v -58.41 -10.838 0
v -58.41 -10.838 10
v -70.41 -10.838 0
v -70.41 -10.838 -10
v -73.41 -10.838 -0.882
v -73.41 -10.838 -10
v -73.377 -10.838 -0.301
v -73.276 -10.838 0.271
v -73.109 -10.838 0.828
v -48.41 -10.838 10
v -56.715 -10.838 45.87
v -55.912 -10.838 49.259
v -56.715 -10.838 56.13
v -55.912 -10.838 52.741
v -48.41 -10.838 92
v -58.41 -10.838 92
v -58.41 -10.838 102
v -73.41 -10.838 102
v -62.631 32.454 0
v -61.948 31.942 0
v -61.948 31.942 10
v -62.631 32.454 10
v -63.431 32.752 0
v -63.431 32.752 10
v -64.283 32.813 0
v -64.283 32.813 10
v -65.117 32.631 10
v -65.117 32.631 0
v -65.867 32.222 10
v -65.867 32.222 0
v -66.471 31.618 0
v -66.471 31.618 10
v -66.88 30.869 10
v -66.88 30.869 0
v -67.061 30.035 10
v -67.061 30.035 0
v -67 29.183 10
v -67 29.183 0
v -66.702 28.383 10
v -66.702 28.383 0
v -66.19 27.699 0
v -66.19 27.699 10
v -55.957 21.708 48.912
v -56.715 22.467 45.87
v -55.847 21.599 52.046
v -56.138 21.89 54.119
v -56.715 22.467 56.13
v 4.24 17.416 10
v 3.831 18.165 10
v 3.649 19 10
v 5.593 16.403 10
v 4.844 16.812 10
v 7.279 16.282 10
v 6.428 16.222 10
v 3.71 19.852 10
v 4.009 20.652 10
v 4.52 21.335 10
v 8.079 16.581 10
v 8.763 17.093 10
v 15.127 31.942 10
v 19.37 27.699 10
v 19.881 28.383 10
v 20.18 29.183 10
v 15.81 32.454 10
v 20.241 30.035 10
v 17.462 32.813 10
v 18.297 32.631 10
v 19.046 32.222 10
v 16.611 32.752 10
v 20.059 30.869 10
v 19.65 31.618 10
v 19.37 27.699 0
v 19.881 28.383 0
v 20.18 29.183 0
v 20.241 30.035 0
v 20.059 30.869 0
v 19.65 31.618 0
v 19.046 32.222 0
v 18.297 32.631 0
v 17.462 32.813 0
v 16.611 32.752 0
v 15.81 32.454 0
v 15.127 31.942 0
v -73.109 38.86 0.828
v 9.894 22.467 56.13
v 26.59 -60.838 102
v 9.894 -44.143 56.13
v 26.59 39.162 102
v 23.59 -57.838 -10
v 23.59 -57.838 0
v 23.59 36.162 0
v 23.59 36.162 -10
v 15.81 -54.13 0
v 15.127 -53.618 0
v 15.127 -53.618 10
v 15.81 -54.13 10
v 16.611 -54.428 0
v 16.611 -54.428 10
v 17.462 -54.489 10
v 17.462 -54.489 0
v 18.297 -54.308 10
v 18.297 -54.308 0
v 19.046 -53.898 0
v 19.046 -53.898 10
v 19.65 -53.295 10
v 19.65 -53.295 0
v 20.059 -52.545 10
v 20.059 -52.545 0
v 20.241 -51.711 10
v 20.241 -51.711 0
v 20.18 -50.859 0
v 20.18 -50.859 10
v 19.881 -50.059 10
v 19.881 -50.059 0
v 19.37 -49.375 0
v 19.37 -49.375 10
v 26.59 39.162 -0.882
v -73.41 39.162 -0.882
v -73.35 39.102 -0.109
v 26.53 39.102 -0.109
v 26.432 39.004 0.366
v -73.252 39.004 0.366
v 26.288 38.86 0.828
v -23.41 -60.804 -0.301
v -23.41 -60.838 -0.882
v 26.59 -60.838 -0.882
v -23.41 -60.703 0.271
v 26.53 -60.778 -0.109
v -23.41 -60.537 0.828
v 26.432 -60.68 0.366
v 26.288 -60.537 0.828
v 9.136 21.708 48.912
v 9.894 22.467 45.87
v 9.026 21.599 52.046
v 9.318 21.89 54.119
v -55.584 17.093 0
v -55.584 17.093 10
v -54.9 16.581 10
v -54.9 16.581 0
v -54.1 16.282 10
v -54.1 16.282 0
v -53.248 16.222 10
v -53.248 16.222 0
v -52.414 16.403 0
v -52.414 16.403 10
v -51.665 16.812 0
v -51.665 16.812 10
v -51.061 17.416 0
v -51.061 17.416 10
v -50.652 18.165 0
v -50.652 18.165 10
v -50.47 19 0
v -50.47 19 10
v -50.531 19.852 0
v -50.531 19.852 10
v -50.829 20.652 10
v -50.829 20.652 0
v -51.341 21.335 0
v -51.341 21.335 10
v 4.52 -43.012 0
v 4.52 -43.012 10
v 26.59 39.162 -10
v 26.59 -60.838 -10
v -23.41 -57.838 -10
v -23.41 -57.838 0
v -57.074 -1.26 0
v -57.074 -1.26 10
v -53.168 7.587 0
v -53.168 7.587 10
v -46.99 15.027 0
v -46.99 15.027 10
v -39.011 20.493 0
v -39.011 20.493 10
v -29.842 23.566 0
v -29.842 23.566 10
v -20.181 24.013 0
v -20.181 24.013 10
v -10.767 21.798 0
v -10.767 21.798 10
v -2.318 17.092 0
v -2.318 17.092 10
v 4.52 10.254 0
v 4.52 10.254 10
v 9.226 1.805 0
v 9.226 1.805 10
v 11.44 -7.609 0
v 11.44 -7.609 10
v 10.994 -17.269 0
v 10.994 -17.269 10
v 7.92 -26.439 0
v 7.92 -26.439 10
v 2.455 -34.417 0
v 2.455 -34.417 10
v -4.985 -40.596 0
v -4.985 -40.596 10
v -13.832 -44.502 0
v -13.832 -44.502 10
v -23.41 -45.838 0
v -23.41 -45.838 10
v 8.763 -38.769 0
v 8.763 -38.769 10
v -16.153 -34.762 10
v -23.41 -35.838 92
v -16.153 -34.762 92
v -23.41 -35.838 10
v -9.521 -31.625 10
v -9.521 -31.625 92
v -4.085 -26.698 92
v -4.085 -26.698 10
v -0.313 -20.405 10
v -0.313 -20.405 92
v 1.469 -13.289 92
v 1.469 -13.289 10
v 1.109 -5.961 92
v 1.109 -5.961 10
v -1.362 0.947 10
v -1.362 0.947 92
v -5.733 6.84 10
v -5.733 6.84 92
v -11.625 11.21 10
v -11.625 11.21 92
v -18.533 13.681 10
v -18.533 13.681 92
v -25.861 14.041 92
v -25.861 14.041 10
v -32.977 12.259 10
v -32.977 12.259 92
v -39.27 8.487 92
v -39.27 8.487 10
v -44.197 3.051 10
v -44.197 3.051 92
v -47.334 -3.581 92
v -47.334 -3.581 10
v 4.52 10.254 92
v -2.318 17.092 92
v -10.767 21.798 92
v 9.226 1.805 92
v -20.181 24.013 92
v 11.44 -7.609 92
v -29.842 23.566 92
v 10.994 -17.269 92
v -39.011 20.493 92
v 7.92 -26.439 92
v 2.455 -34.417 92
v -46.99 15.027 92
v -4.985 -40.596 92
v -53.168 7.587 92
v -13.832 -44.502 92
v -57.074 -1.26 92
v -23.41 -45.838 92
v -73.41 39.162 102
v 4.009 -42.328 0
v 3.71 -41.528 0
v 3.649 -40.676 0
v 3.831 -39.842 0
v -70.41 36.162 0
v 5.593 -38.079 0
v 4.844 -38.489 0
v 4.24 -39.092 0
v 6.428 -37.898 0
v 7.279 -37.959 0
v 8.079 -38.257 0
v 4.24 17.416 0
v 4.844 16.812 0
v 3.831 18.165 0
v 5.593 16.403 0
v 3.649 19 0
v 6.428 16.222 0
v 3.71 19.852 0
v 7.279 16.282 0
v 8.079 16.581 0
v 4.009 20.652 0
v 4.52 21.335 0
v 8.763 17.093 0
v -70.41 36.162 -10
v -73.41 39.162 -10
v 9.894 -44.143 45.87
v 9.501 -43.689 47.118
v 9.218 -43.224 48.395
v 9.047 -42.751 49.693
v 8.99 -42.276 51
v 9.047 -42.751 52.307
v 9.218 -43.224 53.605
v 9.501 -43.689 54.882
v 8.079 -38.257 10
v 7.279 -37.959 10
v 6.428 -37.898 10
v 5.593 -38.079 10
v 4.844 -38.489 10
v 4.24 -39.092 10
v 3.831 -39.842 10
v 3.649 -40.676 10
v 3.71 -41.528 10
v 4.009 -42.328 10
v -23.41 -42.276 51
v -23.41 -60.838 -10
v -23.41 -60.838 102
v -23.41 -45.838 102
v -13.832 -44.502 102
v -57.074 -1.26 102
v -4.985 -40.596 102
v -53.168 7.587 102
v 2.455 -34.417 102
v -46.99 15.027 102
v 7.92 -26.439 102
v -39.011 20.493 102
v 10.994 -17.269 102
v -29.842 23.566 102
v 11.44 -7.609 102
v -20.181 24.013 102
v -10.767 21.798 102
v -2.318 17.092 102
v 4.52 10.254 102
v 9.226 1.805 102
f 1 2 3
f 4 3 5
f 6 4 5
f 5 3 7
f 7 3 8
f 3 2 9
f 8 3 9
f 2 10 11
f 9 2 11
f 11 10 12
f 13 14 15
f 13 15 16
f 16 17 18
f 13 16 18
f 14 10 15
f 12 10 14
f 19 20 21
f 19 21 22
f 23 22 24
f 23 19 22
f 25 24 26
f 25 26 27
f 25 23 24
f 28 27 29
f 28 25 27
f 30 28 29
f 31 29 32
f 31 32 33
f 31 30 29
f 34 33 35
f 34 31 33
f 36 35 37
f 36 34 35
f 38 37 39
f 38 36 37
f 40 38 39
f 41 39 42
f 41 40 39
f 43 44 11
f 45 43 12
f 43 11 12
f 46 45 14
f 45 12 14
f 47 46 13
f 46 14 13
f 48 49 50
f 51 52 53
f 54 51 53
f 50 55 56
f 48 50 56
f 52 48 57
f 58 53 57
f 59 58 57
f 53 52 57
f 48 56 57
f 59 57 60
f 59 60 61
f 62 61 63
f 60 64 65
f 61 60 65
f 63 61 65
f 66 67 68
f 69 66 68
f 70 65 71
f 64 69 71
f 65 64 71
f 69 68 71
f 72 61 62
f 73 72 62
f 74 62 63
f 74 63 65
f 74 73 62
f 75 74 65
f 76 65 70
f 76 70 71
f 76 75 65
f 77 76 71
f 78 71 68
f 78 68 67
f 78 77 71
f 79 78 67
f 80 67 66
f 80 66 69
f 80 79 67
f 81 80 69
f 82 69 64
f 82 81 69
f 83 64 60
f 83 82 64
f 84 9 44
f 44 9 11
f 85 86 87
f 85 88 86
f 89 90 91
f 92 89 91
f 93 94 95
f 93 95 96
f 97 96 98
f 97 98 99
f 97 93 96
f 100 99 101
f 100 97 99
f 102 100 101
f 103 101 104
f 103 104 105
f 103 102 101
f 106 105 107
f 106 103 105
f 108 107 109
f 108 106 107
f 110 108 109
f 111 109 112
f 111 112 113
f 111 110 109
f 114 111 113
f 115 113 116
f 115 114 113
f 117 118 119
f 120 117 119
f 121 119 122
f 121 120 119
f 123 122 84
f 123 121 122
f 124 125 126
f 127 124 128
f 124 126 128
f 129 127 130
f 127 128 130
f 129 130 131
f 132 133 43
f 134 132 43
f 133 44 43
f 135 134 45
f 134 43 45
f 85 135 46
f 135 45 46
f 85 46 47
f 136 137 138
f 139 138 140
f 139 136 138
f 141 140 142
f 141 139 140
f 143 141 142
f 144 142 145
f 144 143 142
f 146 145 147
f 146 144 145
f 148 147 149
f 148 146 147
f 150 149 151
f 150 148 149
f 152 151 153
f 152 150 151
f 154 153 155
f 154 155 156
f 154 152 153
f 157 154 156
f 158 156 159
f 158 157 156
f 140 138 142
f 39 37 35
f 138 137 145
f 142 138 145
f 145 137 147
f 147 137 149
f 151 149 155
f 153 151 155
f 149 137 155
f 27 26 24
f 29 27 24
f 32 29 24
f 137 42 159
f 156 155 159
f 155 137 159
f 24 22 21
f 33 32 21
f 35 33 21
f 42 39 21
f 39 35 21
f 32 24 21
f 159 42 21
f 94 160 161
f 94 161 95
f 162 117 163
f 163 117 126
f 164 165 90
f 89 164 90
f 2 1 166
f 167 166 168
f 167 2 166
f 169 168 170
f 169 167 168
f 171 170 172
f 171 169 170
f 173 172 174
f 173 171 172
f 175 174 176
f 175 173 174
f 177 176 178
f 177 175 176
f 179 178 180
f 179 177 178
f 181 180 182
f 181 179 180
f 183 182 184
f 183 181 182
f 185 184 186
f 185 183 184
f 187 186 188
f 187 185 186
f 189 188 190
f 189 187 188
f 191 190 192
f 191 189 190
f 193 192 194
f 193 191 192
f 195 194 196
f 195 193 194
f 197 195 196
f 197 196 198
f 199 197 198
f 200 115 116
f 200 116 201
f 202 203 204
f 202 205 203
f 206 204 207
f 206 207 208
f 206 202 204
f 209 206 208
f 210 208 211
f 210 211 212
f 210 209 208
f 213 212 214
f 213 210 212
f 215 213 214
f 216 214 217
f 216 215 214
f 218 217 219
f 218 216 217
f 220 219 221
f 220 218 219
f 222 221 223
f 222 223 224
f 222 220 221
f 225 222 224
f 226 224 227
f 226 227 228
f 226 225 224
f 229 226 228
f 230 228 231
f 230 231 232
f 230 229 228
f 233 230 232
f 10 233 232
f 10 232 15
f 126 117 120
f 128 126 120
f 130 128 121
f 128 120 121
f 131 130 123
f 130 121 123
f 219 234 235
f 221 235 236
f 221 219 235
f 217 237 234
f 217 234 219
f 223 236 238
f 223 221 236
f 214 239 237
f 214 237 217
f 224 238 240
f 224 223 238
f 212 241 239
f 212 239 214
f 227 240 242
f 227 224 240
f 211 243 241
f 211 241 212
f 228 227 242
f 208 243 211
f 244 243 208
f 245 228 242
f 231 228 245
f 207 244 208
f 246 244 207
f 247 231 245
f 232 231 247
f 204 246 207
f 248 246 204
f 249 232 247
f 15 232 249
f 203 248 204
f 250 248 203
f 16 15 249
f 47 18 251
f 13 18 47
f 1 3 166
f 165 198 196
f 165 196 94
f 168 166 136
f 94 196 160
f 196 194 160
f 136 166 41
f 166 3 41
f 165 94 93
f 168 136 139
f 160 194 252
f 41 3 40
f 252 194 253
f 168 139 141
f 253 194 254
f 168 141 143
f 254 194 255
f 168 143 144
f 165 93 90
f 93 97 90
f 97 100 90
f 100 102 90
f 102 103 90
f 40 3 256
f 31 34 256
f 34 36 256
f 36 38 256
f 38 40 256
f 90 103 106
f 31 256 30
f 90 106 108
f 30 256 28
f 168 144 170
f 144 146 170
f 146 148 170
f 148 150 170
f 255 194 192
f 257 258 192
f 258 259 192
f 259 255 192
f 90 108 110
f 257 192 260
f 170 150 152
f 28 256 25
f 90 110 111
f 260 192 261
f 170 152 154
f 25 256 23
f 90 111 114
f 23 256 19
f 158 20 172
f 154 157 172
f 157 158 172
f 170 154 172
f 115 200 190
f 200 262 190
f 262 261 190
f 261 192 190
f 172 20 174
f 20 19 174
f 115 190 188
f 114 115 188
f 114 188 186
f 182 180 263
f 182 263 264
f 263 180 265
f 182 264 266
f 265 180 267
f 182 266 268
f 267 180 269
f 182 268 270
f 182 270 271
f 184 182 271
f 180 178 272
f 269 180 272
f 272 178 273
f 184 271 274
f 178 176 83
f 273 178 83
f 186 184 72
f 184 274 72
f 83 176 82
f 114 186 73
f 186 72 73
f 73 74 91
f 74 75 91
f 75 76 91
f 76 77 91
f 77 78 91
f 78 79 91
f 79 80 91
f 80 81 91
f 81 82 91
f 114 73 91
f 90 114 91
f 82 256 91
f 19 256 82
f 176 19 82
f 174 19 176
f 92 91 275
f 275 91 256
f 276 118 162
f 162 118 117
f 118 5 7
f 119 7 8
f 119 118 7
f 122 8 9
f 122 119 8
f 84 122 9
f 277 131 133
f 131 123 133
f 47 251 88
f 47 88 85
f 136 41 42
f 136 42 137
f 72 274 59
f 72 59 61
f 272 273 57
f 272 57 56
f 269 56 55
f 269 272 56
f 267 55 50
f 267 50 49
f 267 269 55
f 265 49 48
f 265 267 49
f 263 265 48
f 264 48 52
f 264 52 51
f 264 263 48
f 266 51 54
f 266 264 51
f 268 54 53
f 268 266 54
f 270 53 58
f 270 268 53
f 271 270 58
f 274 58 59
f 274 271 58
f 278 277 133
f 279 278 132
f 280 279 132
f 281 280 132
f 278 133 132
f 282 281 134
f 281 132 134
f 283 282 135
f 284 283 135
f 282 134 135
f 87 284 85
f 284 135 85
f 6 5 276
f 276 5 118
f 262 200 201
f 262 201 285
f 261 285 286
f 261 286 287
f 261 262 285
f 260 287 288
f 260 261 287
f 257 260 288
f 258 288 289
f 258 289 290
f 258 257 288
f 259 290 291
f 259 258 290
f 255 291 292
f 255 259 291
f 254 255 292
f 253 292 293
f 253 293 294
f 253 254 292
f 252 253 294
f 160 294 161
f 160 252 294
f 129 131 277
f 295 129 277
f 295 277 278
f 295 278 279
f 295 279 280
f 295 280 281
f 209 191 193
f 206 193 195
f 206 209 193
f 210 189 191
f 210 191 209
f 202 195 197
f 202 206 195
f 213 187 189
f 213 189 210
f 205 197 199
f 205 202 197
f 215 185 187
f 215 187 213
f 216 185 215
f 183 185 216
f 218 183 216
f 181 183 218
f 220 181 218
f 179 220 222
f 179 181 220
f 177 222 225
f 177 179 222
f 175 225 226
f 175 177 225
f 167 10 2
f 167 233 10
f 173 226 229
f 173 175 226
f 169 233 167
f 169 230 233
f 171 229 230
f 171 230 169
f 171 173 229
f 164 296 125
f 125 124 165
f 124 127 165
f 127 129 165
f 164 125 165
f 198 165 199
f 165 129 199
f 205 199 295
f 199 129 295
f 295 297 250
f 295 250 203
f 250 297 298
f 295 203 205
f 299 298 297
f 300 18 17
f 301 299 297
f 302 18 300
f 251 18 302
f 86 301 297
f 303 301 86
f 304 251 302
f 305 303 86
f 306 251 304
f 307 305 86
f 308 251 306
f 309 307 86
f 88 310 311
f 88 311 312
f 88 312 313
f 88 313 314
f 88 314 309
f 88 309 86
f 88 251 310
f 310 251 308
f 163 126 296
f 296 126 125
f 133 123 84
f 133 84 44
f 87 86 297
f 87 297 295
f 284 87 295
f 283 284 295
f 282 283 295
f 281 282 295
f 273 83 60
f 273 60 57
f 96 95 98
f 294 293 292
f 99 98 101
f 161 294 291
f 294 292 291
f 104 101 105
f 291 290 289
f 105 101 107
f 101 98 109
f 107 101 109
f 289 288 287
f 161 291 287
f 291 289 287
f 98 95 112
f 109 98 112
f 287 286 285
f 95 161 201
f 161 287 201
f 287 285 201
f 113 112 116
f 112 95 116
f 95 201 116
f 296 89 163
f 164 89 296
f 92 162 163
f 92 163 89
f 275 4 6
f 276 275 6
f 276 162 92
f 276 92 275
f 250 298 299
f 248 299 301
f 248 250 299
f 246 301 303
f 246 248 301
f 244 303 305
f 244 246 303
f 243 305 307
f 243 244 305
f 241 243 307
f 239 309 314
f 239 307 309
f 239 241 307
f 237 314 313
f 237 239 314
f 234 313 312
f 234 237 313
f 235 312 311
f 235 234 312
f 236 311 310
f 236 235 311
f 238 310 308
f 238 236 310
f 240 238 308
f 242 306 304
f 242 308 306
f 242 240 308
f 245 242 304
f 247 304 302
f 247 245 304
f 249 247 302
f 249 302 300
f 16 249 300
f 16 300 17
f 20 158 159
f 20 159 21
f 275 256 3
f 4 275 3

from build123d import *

# Parameters (mm, degrees)
ESQUISSE2_W                  = 100
ESQUISSE2_H                  = 100
BOSS_EXTRU_1_DEPTH           = 51
BOSS_EXTRU_1_TAPER           = 20
ENL_V_MAT_EXTRU_1_DEPTH      = 140.622233322
ENL_V_MAT_EXTRU_1_DEPTH_BACK = 140.622233322
ESQUISSE3_R                  = 25
ENL_V_MAT_EXTRU_2_DEPTH      = 140.622233322
ENL_V_MAT_EXTRU_2_DEPTH_BACK = 10
ESQUISSE5_R                  = 35
ENL_V_START                  = -10
ESQUISSE6_R                  = 35
ENL_V_MAT_EXTRU_3_DEPTH      = 10
ESQUISSE7_W                  = 50
ESQUISSE7_H                  = 50
ENL_V_MAT_EXTRU_4_DEPTH      = 140.622233322
CONG_1_R                     = 15
ENL_V_MAT_EXTRU_8_DEPTH      = 10
BOSS_EXTRU_2_DEPTH           = 10
CONG_2_R                     = 5


with BuildPart() as part:
    # Esquisse2 → Boss.-Extru.1 (new body)
    with BuildSketch(Plane.XY):
        with Locations((-23.410404624, -10.838150289)):
            Rectangle(ESQUISSE2_W, ESQUISSE2_H)
    boss_extru_1 = extrude(amount=BOSS_EXTRU_1_DEPTH, taper=BOSS_EXTRU_1_TAPER)

    # Symétrie4: Boss.-Extru.1 across plane
    add(boss_extru_1.mirror(Plane.XY.offset(51)))

    # Esquisse3 → Enlèv. mat.-Extru.1 (cut, two sides: drawn at the far end of the back side and taken through both)
    with BuildSketch(Plane.XY.offset(102).offset(-ENL_V_MAT_EXTRU_1_DEPTH_BACK)):
        with Locations((-23.410404624, -10.838150289)):
            Circle(ESQUISSE3_R)
    extrude(amount=ENL_V_MAT_EXTRU_1_DEPTH + ENL_V_MAT_EXTRU_1_DEPTH_BACK, mode=Mode.SUBTRACT)

    # Esquisse5 → Enlèv. mat.-Extru.2 (cut, two sides: drawn at the far end of the back side and taken through both)
    with BuildSketch(Plane.XY.offset(102).offset(-ENL_V_MAT_EXTRU_2_DEPTH_BACK)):
        with Locations(Location((-23.410404624, -10.838150289, 0), (0, 0, 180))):
            Circle(ESQUISSE5_R)
    extrude(amount=ENL_V_MAT_EXTRU_2_DEPTH + ENL_V_MAT_EXTRU_2_DEPTH_BACK, mode=Mode.SUBTRACT)

    # Esquisse6 → Enlèv. mat.-Extru.3 (cut)
    with BuildSketch(Plane(origin=(0, 0, 0), x_dir=(-1, 0, 0), z_dir=(0, 0, -1)).offset(ENL_V_START)):
        with Locations((23.410404624, -10.838150289)):
            Circle(ESQUISSE6_R)
    extrude(amount=ENL_V_MAT_EXTRU_3_DEPTH, mode=Mode.SUBTRACT)

    # Esquisse7 → Enlèv. mat.-Extru.4 (cut, through all)
    with BuildSketch(Plane(origin=(0, 0, 0), x_dir=(-1, 0, 0), z_dir=(0, 0, -1))):
        with Locations((48.410404624, -35.838150289)):
            Rectangle(ESQUISSE7_W, ESQUISSE7_H)
    extrude(amount=-ENL_V_MAT_EXTRU_4_DEPTH, mode=Mode.SUBTRACT)

    # Congé1
    cong_1_edges = [part.edges().sort_by_distance(p)[0] for p in [
        (8.027113428, -10.838150289, 51),
        (-23.410404624, 20.599367763, 51),
        (-54.847922677, 4.880608737, 51),
    ]]
    fillet(cong_1_edges, radius=CONG_1_R)

    # Esquisse8 → Enlèv. mat.-Extru.8 (cut)
    with BuildSketch(Plane(origin=(0, 0, 0), x_dir=(-1, 0, 0), z_dir=(0, 0, -1))):
        with BuildLine():
            Line((-15.12691495, 31.941809973), (-4.520313233, 21.335208255))
            ThreePointArc((-4.520313233, 21.335208255), (-4.520313233, 17.092567568), (-8.76295392, 17.092567568))
            Line((-8.76295392, 17.092567568), (-19.369555638, 27.699169286))
            ThreePointArc((-19.369555638, 27.699169286), (-19.369555638, 31.941809973), (-15.12691495, 31.941809973))
        make_face()
        with BuildLine():
            Line((-19.369555638, -49.375469864), (-8.76295392, -38.768868146))
            ThreePointArc((-8.76295392, -38.768868146), (-4.520313233, -38.768868146), (-4.520313233, -43.011508833))
            Line((-4.520313233, -43.011508833), (-15.12691495, -53.618110551))
            ThreePointArc((-15.12691495, -53.618110551), (-19.369555638, -53.618110551), (-19.369555638, -49.375469864))
        make_face()
        with BuildLine():
            Line((51.341122481, 21.335208255), (61.947724199, 31.941809973))
            ThreePointArc((61.947724199, 31.941809973), (66.190364886, 31.941809973), (66.190364886, 27.699169286))
            Line((66.190364886, 27.699169286), (55.583763168, 17.092567568))
            ThreePointArc((55.583763168, 17.092567568), (51.341122481, 17.092567568), (51.341122481, 21.335208255))
        make_face()
    extrude(amount=-ENL_V_MAT_EXTRU_8_DEPTH, mode=Mode.SUBTRACT)

    # Esquisse9 → Boss.-Extru.2 (add)
    with BuildSketch(Plane(origin=(0, 0, 0), x_dir=(-1, 0, 0), z_dir=(0, 0, -1))):
        Polygon((-26.589595376, -60.838150289), (23.410404624, -60.838150289), (23.410404624, -57.838150289), (-23.589595376, -57.838150289), (-23.589595376, 36.161849711), (70.410404624, 36.161849711), (70.410404624, -10.838150289), (73.410404624, -10.838150289), (73.410404624, 39.161849711), (-26.589595376, 39.161849711), align=None)
    extrude(amount=BOSS_EXTRU_2_DEPTH)

    # Congé2
    cong_2_edges = [part.edges().sort_by_distance(p)[0] for p in [
        (-23.410404624, 39.161849711, 0),
        (26.589595376, -10.838150289, 0),
        (-73.410404624, 14.161849711, 0),
        (1.589595376, -60.838150289, 0),
    ]]
    fillet(cong_2_edges, radius=CONG_2_R)


solid = part.part
